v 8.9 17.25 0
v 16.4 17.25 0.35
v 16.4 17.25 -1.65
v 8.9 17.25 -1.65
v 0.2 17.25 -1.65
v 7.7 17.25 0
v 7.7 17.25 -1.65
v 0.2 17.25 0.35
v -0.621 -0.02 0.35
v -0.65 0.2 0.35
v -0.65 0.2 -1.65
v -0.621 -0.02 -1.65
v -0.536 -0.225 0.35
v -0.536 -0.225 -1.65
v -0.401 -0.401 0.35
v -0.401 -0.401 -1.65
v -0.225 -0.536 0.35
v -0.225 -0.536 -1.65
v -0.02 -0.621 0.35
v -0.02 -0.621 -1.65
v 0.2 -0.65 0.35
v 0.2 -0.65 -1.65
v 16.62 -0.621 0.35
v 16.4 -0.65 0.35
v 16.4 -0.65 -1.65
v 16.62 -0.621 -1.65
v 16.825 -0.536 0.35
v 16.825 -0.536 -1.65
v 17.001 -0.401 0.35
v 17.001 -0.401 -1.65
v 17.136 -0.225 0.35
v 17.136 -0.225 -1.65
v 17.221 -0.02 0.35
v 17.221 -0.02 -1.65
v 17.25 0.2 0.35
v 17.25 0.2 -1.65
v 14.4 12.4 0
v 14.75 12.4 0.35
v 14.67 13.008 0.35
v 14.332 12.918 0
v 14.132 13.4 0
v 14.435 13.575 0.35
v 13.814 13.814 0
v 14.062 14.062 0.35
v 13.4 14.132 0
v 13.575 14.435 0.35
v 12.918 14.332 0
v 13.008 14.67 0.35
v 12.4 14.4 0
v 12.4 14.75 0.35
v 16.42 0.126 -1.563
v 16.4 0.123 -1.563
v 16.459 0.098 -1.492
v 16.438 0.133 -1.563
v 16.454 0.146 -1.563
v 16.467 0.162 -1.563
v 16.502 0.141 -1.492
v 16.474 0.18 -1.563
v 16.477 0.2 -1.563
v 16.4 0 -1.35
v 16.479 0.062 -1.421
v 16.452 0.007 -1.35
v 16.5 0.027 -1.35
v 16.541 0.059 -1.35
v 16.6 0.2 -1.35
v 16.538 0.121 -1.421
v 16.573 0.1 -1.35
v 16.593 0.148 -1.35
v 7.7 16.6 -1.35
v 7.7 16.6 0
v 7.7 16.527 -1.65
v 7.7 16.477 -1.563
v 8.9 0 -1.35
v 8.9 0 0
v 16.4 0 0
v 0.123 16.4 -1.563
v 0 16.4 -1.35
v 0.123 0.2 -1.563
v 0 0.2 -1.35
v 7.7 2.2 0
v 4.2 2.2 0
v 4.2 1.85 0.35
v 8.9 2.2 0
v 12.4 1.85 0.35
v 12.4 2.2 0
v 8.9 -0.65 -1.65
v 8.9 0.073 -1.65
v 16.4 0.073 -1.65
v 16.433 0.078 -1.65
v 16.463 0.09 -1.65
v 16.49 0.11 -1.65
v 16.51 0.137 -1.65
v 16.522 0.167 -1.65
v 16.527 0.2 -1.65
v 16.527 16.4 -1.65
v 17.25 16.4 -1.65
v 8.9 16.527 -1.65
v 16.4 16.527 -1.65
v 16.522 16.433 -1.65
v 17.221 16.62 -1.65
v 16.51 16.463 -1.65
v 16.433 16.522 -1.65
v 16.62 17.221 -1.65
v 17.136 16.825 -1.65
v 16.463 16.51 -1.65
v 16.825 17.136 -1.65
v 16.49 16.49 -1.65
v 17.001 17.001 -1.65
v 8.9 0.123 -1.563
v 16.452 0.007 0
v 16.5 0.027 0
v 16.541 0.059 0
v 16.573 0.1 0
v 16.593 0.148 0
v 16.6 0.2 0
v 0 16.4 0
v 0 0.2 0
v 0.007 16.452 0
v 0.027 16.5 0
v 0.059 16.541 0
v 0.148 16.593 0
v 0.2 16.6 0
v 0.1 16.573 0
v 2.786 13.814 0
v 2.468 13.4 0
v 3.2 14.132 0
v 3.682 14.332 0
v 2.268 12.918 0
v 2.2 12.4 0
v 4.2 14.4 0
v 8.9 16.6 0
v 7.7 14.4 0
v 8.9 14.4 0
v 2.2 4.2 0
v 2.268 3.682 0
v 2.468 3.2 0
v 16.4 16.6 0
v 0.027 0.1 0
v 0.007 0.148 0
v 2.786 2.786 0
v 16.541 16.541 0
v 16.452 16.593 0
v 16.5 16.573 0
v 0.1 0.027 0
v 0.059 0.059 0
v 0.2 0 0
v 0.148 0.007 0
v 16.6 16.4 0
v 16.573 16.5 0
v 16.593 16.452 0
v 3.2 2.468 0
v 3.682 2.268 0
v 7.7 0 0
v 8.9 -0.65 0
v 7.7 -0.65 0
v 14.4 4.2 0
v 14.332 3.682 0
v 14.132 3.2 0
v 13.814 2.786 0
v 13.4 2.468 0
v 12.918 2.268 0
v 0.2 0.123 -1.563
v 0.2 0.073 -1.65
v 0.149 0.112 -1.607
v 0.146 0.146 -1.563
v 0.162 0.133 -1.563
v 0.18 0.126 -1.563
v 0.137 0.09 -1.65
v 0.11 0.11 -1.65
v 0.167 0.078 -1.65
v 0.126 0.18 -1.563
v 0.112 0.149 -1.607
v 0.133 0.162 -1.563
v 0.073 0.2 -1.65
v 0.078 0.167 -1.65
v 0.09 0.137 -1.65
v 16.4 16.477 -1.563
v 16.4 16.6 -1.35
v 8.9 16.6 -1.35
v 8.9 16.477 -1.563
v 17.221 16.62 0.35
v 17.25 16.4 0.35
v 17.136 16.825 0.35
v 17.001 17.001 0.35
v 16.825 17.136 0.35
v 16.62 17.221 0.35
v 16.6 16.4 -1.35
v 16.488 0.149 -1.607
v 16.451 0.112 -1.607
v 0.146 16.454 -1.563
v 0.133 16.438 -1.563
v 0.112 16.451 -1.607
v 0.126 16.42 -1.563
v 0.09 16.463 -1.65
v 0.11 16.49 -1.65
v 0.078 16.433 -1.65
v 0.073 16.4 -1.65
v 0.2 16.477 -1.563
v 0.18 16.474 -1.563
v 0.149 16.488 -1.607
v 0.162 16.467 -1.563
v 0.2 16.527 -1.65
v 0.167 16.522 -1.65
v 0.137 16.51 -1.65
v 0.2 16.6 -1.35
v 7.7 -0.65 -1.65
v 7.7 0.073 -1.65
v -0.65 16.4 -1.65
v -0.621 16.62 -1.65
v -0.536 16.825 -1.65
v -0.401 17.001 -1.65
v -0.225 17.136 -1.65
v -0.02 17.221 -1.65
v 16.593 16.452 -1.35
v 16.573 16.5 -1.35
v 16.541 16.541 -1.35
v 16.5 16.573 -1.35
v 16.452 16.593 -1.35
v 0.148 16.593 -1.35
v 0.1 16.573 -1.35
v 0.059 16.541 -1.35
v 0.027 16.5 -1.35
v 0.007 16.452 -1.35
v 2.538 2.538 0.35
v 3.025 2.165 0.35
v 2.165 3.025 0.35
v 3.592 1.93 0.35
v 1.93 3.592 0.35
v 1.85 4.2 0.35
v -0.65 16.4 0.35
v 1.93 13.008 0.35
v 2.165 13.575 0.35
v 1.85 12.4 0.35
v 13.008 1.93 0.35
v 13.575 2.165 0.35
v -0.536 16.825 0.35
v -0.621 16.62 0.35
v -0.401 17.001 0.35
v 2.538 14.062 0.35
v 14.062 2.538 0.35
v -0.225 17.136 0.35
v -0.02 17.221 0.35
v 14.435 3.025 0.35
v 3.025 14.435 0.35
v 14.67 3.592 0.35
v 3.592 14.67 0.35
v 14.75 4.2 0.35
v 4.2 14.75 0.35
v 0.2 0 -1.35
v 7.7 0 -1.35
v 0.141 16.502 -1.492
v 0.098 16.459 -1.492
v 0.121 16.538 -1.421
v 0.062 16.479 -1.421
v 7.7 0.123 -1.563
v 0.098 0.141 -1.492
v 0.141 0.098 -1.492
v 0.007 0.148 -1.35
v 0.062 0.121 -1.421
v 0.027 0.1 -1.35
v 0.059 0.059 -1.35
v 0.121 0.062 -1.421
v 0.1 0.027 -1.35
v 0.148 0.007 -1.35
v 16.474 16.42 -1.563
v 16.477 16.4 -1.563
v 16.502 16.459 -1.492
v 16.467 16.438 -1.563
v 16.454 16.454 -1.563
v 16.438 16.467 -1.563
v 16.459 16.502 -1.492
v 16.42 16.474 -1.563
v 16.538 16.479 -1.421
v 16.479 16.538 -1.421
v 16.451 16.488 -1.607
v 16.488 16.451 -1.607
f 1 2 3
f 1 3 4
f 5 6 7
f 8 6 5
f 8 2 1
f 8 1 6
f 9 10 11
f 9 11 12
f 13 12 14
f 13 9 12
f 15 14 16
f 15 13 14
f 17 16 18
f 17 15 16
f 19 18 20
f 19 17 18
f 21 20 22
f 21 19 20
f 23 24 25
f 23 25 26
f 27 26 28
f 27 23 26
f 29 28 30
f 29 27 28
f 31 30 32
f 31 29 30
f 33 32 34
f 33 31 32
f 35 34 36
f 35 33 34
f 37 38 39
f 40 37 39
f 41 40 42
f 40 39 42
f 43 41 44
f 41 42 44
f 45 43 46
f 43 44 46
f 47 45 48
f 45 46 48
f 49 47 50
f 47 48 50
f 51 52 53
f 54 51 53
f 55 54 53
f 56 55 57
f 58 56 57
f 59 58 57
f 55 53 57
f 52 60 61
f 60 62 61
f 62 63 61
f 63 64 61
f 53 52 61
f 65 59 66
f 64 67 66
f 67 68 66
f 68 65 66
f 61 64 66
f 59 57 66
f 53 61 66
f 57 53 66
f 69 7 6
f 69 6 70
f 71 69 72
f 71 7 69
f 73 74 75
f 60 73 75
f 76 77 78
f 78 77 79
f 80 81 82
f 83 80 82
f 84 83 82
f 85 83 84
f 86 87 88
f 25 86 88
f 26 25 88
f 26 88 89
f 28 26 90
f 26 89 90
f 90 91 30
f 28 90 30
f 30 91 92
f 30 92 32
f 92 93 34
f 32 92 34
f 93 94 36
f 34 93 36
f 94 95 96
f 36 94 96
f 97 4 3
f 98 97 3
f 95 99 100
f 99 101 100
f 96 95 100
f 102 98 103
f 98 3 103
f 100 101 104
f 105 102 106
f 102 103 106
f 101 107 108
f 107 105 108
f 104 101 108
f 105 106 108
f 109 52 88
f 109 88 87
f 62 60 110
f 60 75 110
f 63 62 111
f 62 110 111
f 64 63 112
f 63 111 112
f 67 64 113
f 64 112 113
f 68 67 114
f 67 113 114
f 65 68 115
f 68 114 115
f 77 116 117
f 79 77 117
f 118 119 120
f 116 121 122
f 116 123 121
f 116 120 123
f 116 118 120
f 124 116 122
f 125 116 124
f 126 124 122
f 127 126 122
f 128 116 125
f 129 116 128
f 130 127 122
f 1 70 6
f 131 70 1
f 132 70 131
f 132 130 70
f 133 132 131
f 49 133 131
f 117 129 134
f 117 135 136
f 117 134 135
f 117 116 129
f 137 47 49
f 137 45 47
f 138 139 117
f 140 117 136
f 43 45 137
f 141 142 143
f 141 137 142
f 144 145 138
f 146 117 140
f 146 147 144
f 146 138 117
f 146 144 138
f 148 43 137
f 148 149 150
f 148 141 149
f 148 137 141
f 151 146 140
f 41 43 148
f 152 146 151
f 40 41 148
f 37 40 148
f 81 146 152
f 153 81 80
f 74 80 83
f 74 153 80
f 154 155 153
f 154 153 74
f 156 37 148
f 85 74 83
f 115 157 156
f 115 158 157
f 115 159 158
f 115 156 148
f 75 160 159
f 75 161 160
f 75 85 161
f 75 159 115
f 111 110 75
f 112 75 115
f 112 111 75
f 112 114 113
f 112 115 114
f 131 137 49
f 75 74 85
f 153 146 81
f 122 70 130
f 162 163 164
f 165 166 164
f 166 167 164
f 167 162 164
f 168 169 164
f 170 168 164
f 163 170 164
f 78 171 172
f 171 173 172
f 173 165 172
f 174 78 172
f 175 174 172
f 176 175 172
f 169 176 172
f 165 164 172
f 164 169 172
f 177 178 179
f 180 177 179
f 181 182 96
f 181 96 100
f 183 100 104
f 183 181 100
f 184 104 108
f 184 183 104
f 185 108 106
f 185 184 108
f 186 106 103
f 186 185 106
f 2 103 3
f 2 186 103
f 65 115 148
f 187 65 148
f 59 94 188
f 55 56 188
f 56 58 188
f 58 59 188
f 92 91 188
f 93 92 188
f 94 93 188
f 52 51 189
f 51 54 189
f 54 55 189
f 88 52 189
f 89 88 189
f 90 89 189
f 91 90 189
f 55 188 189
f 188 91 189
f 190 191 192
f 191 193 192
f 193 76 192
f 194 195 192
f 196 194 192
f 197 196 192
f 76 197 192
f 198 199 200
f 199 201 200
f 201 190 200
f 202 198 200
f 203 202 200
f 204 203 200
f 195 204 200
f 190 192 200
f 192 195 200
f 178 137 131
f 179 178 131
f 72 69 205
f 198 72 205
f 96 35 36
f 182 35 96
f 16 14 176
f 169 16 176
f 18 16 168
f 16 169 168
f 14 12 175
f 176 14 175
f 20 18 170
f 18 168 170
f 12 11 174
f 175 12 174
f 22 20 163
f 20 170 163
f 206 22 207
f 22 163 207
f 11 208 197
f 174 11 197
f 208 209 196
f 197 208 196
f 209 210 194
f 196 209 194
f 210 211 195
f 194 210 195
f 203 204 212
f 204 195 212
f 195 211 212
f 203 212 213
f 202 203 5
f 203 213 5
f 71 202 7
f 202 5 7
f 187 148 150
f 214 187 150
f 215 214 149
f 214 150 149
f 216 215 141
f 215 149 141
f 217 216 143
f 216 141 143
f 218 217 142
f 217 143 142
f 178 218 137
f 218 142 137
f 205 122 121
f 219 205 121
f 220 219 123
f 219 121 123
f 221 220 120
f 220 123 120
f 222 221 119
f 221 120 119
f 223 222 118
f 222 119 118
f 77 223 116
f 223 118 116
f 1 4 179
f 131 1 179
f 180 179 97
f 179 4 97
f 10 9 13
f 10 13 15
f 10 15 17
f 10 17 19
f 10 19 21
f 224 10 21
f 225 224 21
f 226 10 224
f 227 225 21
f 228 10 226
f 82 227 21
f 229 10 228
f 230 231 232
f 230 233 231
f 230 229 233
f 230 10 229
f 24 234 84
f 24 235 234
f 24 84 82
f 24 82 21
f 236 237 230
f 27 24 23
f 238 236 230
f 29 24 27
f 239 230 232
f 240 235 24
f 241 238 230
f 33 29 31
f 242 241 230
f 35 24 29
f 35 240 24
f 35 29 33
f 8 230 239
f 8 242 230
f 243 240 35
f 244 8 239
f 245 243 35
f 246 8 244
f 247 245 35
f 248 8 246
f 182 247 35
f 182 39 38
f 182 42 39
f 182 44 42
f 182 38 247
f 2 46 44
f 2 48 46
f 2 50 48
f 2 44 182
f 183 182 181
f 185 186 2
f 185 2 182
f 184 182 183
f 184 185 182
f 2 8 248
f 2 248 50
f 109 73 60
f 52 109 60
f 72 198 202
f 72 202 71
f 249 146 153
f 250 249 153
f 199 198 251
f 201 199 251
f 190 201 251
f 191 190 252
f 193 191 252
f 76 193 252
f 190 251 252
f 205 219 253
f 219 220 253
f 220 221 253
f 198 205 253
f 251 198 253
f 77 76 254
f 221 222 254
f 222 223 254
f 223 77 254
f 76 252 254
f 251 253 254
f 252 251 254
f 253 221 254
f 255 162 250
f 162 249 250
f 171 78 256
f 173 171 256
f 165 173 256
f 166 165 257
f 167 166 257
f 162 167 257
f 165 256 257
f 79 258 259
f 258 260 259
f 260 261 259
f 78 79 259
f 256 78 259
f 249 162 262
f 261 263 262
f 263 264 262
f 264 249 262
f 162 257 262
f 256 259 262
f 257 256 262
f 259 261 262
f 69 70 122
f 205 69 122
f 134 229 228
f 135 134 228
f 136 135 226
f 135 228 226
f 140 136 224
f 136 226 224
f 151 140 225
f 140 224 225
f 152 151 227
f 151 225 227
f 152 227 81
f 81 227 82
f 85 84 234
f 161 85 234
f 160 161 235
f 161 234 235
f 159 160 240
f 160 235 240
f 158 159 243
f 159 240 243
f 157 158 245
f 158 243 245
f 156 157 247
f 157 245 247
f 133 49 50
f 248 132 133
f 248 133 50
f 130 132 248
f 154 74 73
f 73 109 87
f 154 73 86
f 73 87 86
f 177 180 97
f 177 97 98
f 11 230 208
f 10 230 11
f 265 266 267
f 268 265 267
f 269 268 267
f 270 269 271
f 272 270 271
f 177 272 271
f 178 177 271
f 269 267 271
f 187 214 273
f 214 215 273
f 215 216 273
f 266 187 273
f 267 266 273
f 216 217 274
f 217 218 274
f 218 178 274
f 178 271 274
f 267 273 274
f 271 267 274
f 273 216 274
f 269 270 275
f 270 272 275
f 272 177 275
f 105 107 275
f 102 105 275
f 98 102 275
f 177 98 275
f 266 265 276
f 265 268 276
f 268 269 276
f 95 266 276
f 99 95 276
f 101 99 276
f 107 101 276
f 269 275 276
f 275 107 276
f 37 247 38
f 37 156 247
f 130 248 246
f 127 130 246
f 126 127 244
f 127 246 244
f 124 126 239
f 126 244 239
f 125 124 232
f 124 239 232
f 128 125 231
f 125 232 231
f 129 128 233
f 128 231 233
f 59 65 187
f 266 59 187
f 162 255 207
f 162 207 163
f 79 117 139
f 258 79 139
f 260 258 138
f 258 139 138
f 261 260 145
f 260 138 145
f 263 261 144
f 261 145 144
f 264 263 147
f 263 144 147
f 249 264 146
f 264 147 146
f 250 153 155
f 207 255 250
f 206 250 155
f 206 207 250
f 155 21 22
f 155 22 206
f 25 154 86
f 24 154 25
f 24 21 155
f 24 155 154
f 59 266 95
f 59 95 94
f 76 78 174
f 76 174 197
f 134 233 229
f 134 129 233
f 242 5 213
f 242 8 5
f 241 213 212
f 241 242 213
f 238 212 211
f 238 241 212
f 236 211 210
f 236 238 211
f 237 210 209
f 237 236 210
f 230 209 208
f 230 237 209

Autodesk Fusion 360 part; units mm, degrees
sketch "Sketch1" plane through (0, 0, 0) normal (0, 0, 1) x (1, 0, 0)
  line L0 (0.2, 0) -> (16.4, 0)
  line L1 (16.6, 0.2) -> (16.6, 16.4)
  line L2 (16.4, 16.6) -> (0.2, 16.6)
  line L3 (0, 16.4) -> (0, 0.2)
  arc A0 (0.2, 16.6) -> (0, 16.4) centre (0.2, 16.4) ccw
  arc A1 (16.6, 16.4) -> (16.4, 16.6) centre (16.4, 16.4) ccw
  arc A2 (16.4, 0) -> (16.6, 0.2) centre (16.4, 0.2) ccw
  arc A3 (0, 0.2) -> (0.2, 0) centre (0.2, 0.2) ccw
  line L4 (16.4, 17.25) -> (0.2, 17.25)
  arc A4 (0.2, 17.25) -> (-0.65, 16.4) centre (0.2, 16.4) ccw
  line L5 (-0.65, 16.4) -> (-0.65, 0.2)
  arc A5 (-0.65, 0.2) -> (0.2, -0.65) centre (0.2, 0.2) ccw
  line L6 (0.2, -0.65) -> (16.4, -0.65)
  arc A6 (16.4, -0.65) -> (17.25, 0.2) centre (16.4, 0.2) ccw
  line L7 (17.25, 0.2) -> (17.25, 16.4)
  arc A7 (17.25, 16.4) -> (16.4, 17.25) centre (16.4, 16.4) ccw
  line L8 (14.4, 14.4) -> (2.2, 14.4)
  line L9 (2.2, 14.4) -> (2.2, 2.2)
  line L10 (2.2, 2.2) -> (14.4, 2.2)
  line L11 (14.4, 2.2) -> (14.4, 14.4)
  line L12 (0.2, -5) -> (16.4, -5)
  arc A8 (16.4, -5) -> (21.6, 0.2) centre (16.4, 0.2) ccw
  line L13 (21.6, 0.2) -> (21.6, 16.4)
  arc A9 (21.6, 16.4) -> (16.4, 21.6) centre (16.4, 16.4) ccw
  line L14 (16.4, 21.6) -> (0.2, 21.6)
  arc A10 (0.2, 21.6) -> (-5, 16.4) centre (0.2, 16.4) ccw
  line L15 (-5, 16.4) -> (-5, 0.2)
  arc A11 (-5, 0.2) -> (0.2, -5) centre (0.2, 0.2) ccw
  point P0 (16.6, 0)
  point P1 (0, 16.6)
  dimension "d1" = 16.6
  dimension "d2" = 16.6
  dimension "d3" = 0.2
  dimension "d4" = 0.65
  dimension "d5" = -2.2
  dimension "d15" = 5
extrude "Extrude1" add sketch "Sketch1" along normal blind 0.35 contours L0 L1 L2 L3 A0 A1 A2 A3 | L4 A4 L5 A5 L6 A6 L7 A7
extrude "Extrude2" add sketch "Sketch1" against normal blind 1.35 contours L4 A4 L5 A5 L6 A6 L7 A7
fillet "Fillet1" radius 2 4 edges at (2.2, 14.4, 0.175) (14.4, 14.4, 0.175) (14.4, 2.2, 0.175) (2.2, 2.2, 0.175)
chamfer "Chamfer1" distance 0.35 angle 45 8 edges at (8.3, 14.4, 0.35) (13.8142, 13.8142, 0.35) (14.4, 8.3, 0.35) (13.8142, 2.7858, 0.35) (8.3, 2.2, 0.35) (2.7858, 2.7858, 0.35) (2.2, 8.3, 0.35) (2.7858, 13.8142, 0.35)
extrude "Extrude3" add 1 faces at (17.0333, 5.6, -1.35) along direction (0, 0, -1) blind 0.3 draft 30
extrude "Extrude4" cut sketch "Sketch1" against normal blind 6 contours L12 A8 L13 A9 L14 A10 L15 A11
chamfer "Chamfer2" distance 0.1 angle 45 8 edges at (8.3, 16.4268, -1.65) (0.1811, 16.4189, -1.65) (0.1732, 8.3, -1.65) (0.1811, 0.1811, -1.65) (8.3, 0.1732, -1.65) (16.4189, 0.1811, -1.65) (16.4268, 8.3, -1.65) (16.4189, 16.4189, -1.65)
sketch "Sketch2" plane through (0, 0, -1.65) normal (0, 0, -1) x (1, 0, 0)
  line L0 (17.25, -16.4) -> (17.25, -0.2)
  arc A0 (17.25, -0.2) -> (16.4, 0.65) centre (16.4, -0.2) ccw
  line L1 (16.4, 0.65) -> (0.2, 0.65)
  arc A1 (0.2, 0.65) -> (-0.65, -0.2) centre (0.2, -0.2) ccw
  line L2 (-0.65, -0.2) -> (-0.65, -16.4)
  arc A2 (-0.65, -16.4) -> (0.2, -17.25) centre (0.2, -16.4) ccw
  line L3 (0.2, -17.25) -> (16.4, -17.25)
  arc A3 (16.4, -17.25) -> (17.25, -16.4) centre (16.4, -16.4) ccw
  line L4 (16.4, -16.5268) -> (0.2, -16.5268)
  arc A4 (0.0732, -16.4) -> (0.2, -16.5268) centre (0.2, -16.4) ccw
  line L5 (0.0732, -16.4) -> (0.0732, -0.2)
  arc A5 (0.2, -0.0732) -> (0.0732, -0.2) centre (0.2, -0.2) ccw
  line L6 (0.2, -0.0732) -> (16.4, -0.0732)
  arc A6 (16.5268, -0.2) -> (16.4, -0.0732) centre (16.4, -0.2) ccw
  line L7 (16.5268, -0.2) -> (16.5268, -16.4)
  arc A7 (16.4, -16.5268) -> (16.5268, -16.4) centre (16.4, -16.4) ccw
  line L8 (8.3, 0.65) -> (8.3, -17.25) construction
  line L9 (7.7, -17.25) -> (7.7, 0.65)
  line L10 (8.9, -17.25) -> (8.9, 0.65)
  line L11 (8.3, -8.3) -> (0.2, 0.65)
  line L12 (8.3, -8.3) -> (-0.65, -0.2)
  line L13 (8.3, -8.3) -> (-0.65, -16.4)
  line L14 (8.3, -8.3) -> (0.2, -17.25)
  line L15 (8.3, -8.3) -> (16.4, -17.25)
  line L16 (8.3, -8.3) -> (17.25, -16.4)
  line L17 (8.3, -8.3) -> (17.25, -0.2)
  line L18 (8.3, -8.3) -> (16.4, 0.65)
  point P0 (0.5, -16.2)
  point P1 (0.5, -0.5)
  point P2 (16.2, -0.5)
  point P3 (16.2, -16.2)
  dimension "d19" = 0.6
  dimension "d23" = 360
extrude "Extrude5" cut sketch "Sketch2" against normal up to surface (1.65 mm away) contours L3 L4 L9 L10 | L1 L6 L9 L10 | L4 L9 L10 L14 L15 | L6 L9 L10 L11 L18
equation "d1 = d2"
